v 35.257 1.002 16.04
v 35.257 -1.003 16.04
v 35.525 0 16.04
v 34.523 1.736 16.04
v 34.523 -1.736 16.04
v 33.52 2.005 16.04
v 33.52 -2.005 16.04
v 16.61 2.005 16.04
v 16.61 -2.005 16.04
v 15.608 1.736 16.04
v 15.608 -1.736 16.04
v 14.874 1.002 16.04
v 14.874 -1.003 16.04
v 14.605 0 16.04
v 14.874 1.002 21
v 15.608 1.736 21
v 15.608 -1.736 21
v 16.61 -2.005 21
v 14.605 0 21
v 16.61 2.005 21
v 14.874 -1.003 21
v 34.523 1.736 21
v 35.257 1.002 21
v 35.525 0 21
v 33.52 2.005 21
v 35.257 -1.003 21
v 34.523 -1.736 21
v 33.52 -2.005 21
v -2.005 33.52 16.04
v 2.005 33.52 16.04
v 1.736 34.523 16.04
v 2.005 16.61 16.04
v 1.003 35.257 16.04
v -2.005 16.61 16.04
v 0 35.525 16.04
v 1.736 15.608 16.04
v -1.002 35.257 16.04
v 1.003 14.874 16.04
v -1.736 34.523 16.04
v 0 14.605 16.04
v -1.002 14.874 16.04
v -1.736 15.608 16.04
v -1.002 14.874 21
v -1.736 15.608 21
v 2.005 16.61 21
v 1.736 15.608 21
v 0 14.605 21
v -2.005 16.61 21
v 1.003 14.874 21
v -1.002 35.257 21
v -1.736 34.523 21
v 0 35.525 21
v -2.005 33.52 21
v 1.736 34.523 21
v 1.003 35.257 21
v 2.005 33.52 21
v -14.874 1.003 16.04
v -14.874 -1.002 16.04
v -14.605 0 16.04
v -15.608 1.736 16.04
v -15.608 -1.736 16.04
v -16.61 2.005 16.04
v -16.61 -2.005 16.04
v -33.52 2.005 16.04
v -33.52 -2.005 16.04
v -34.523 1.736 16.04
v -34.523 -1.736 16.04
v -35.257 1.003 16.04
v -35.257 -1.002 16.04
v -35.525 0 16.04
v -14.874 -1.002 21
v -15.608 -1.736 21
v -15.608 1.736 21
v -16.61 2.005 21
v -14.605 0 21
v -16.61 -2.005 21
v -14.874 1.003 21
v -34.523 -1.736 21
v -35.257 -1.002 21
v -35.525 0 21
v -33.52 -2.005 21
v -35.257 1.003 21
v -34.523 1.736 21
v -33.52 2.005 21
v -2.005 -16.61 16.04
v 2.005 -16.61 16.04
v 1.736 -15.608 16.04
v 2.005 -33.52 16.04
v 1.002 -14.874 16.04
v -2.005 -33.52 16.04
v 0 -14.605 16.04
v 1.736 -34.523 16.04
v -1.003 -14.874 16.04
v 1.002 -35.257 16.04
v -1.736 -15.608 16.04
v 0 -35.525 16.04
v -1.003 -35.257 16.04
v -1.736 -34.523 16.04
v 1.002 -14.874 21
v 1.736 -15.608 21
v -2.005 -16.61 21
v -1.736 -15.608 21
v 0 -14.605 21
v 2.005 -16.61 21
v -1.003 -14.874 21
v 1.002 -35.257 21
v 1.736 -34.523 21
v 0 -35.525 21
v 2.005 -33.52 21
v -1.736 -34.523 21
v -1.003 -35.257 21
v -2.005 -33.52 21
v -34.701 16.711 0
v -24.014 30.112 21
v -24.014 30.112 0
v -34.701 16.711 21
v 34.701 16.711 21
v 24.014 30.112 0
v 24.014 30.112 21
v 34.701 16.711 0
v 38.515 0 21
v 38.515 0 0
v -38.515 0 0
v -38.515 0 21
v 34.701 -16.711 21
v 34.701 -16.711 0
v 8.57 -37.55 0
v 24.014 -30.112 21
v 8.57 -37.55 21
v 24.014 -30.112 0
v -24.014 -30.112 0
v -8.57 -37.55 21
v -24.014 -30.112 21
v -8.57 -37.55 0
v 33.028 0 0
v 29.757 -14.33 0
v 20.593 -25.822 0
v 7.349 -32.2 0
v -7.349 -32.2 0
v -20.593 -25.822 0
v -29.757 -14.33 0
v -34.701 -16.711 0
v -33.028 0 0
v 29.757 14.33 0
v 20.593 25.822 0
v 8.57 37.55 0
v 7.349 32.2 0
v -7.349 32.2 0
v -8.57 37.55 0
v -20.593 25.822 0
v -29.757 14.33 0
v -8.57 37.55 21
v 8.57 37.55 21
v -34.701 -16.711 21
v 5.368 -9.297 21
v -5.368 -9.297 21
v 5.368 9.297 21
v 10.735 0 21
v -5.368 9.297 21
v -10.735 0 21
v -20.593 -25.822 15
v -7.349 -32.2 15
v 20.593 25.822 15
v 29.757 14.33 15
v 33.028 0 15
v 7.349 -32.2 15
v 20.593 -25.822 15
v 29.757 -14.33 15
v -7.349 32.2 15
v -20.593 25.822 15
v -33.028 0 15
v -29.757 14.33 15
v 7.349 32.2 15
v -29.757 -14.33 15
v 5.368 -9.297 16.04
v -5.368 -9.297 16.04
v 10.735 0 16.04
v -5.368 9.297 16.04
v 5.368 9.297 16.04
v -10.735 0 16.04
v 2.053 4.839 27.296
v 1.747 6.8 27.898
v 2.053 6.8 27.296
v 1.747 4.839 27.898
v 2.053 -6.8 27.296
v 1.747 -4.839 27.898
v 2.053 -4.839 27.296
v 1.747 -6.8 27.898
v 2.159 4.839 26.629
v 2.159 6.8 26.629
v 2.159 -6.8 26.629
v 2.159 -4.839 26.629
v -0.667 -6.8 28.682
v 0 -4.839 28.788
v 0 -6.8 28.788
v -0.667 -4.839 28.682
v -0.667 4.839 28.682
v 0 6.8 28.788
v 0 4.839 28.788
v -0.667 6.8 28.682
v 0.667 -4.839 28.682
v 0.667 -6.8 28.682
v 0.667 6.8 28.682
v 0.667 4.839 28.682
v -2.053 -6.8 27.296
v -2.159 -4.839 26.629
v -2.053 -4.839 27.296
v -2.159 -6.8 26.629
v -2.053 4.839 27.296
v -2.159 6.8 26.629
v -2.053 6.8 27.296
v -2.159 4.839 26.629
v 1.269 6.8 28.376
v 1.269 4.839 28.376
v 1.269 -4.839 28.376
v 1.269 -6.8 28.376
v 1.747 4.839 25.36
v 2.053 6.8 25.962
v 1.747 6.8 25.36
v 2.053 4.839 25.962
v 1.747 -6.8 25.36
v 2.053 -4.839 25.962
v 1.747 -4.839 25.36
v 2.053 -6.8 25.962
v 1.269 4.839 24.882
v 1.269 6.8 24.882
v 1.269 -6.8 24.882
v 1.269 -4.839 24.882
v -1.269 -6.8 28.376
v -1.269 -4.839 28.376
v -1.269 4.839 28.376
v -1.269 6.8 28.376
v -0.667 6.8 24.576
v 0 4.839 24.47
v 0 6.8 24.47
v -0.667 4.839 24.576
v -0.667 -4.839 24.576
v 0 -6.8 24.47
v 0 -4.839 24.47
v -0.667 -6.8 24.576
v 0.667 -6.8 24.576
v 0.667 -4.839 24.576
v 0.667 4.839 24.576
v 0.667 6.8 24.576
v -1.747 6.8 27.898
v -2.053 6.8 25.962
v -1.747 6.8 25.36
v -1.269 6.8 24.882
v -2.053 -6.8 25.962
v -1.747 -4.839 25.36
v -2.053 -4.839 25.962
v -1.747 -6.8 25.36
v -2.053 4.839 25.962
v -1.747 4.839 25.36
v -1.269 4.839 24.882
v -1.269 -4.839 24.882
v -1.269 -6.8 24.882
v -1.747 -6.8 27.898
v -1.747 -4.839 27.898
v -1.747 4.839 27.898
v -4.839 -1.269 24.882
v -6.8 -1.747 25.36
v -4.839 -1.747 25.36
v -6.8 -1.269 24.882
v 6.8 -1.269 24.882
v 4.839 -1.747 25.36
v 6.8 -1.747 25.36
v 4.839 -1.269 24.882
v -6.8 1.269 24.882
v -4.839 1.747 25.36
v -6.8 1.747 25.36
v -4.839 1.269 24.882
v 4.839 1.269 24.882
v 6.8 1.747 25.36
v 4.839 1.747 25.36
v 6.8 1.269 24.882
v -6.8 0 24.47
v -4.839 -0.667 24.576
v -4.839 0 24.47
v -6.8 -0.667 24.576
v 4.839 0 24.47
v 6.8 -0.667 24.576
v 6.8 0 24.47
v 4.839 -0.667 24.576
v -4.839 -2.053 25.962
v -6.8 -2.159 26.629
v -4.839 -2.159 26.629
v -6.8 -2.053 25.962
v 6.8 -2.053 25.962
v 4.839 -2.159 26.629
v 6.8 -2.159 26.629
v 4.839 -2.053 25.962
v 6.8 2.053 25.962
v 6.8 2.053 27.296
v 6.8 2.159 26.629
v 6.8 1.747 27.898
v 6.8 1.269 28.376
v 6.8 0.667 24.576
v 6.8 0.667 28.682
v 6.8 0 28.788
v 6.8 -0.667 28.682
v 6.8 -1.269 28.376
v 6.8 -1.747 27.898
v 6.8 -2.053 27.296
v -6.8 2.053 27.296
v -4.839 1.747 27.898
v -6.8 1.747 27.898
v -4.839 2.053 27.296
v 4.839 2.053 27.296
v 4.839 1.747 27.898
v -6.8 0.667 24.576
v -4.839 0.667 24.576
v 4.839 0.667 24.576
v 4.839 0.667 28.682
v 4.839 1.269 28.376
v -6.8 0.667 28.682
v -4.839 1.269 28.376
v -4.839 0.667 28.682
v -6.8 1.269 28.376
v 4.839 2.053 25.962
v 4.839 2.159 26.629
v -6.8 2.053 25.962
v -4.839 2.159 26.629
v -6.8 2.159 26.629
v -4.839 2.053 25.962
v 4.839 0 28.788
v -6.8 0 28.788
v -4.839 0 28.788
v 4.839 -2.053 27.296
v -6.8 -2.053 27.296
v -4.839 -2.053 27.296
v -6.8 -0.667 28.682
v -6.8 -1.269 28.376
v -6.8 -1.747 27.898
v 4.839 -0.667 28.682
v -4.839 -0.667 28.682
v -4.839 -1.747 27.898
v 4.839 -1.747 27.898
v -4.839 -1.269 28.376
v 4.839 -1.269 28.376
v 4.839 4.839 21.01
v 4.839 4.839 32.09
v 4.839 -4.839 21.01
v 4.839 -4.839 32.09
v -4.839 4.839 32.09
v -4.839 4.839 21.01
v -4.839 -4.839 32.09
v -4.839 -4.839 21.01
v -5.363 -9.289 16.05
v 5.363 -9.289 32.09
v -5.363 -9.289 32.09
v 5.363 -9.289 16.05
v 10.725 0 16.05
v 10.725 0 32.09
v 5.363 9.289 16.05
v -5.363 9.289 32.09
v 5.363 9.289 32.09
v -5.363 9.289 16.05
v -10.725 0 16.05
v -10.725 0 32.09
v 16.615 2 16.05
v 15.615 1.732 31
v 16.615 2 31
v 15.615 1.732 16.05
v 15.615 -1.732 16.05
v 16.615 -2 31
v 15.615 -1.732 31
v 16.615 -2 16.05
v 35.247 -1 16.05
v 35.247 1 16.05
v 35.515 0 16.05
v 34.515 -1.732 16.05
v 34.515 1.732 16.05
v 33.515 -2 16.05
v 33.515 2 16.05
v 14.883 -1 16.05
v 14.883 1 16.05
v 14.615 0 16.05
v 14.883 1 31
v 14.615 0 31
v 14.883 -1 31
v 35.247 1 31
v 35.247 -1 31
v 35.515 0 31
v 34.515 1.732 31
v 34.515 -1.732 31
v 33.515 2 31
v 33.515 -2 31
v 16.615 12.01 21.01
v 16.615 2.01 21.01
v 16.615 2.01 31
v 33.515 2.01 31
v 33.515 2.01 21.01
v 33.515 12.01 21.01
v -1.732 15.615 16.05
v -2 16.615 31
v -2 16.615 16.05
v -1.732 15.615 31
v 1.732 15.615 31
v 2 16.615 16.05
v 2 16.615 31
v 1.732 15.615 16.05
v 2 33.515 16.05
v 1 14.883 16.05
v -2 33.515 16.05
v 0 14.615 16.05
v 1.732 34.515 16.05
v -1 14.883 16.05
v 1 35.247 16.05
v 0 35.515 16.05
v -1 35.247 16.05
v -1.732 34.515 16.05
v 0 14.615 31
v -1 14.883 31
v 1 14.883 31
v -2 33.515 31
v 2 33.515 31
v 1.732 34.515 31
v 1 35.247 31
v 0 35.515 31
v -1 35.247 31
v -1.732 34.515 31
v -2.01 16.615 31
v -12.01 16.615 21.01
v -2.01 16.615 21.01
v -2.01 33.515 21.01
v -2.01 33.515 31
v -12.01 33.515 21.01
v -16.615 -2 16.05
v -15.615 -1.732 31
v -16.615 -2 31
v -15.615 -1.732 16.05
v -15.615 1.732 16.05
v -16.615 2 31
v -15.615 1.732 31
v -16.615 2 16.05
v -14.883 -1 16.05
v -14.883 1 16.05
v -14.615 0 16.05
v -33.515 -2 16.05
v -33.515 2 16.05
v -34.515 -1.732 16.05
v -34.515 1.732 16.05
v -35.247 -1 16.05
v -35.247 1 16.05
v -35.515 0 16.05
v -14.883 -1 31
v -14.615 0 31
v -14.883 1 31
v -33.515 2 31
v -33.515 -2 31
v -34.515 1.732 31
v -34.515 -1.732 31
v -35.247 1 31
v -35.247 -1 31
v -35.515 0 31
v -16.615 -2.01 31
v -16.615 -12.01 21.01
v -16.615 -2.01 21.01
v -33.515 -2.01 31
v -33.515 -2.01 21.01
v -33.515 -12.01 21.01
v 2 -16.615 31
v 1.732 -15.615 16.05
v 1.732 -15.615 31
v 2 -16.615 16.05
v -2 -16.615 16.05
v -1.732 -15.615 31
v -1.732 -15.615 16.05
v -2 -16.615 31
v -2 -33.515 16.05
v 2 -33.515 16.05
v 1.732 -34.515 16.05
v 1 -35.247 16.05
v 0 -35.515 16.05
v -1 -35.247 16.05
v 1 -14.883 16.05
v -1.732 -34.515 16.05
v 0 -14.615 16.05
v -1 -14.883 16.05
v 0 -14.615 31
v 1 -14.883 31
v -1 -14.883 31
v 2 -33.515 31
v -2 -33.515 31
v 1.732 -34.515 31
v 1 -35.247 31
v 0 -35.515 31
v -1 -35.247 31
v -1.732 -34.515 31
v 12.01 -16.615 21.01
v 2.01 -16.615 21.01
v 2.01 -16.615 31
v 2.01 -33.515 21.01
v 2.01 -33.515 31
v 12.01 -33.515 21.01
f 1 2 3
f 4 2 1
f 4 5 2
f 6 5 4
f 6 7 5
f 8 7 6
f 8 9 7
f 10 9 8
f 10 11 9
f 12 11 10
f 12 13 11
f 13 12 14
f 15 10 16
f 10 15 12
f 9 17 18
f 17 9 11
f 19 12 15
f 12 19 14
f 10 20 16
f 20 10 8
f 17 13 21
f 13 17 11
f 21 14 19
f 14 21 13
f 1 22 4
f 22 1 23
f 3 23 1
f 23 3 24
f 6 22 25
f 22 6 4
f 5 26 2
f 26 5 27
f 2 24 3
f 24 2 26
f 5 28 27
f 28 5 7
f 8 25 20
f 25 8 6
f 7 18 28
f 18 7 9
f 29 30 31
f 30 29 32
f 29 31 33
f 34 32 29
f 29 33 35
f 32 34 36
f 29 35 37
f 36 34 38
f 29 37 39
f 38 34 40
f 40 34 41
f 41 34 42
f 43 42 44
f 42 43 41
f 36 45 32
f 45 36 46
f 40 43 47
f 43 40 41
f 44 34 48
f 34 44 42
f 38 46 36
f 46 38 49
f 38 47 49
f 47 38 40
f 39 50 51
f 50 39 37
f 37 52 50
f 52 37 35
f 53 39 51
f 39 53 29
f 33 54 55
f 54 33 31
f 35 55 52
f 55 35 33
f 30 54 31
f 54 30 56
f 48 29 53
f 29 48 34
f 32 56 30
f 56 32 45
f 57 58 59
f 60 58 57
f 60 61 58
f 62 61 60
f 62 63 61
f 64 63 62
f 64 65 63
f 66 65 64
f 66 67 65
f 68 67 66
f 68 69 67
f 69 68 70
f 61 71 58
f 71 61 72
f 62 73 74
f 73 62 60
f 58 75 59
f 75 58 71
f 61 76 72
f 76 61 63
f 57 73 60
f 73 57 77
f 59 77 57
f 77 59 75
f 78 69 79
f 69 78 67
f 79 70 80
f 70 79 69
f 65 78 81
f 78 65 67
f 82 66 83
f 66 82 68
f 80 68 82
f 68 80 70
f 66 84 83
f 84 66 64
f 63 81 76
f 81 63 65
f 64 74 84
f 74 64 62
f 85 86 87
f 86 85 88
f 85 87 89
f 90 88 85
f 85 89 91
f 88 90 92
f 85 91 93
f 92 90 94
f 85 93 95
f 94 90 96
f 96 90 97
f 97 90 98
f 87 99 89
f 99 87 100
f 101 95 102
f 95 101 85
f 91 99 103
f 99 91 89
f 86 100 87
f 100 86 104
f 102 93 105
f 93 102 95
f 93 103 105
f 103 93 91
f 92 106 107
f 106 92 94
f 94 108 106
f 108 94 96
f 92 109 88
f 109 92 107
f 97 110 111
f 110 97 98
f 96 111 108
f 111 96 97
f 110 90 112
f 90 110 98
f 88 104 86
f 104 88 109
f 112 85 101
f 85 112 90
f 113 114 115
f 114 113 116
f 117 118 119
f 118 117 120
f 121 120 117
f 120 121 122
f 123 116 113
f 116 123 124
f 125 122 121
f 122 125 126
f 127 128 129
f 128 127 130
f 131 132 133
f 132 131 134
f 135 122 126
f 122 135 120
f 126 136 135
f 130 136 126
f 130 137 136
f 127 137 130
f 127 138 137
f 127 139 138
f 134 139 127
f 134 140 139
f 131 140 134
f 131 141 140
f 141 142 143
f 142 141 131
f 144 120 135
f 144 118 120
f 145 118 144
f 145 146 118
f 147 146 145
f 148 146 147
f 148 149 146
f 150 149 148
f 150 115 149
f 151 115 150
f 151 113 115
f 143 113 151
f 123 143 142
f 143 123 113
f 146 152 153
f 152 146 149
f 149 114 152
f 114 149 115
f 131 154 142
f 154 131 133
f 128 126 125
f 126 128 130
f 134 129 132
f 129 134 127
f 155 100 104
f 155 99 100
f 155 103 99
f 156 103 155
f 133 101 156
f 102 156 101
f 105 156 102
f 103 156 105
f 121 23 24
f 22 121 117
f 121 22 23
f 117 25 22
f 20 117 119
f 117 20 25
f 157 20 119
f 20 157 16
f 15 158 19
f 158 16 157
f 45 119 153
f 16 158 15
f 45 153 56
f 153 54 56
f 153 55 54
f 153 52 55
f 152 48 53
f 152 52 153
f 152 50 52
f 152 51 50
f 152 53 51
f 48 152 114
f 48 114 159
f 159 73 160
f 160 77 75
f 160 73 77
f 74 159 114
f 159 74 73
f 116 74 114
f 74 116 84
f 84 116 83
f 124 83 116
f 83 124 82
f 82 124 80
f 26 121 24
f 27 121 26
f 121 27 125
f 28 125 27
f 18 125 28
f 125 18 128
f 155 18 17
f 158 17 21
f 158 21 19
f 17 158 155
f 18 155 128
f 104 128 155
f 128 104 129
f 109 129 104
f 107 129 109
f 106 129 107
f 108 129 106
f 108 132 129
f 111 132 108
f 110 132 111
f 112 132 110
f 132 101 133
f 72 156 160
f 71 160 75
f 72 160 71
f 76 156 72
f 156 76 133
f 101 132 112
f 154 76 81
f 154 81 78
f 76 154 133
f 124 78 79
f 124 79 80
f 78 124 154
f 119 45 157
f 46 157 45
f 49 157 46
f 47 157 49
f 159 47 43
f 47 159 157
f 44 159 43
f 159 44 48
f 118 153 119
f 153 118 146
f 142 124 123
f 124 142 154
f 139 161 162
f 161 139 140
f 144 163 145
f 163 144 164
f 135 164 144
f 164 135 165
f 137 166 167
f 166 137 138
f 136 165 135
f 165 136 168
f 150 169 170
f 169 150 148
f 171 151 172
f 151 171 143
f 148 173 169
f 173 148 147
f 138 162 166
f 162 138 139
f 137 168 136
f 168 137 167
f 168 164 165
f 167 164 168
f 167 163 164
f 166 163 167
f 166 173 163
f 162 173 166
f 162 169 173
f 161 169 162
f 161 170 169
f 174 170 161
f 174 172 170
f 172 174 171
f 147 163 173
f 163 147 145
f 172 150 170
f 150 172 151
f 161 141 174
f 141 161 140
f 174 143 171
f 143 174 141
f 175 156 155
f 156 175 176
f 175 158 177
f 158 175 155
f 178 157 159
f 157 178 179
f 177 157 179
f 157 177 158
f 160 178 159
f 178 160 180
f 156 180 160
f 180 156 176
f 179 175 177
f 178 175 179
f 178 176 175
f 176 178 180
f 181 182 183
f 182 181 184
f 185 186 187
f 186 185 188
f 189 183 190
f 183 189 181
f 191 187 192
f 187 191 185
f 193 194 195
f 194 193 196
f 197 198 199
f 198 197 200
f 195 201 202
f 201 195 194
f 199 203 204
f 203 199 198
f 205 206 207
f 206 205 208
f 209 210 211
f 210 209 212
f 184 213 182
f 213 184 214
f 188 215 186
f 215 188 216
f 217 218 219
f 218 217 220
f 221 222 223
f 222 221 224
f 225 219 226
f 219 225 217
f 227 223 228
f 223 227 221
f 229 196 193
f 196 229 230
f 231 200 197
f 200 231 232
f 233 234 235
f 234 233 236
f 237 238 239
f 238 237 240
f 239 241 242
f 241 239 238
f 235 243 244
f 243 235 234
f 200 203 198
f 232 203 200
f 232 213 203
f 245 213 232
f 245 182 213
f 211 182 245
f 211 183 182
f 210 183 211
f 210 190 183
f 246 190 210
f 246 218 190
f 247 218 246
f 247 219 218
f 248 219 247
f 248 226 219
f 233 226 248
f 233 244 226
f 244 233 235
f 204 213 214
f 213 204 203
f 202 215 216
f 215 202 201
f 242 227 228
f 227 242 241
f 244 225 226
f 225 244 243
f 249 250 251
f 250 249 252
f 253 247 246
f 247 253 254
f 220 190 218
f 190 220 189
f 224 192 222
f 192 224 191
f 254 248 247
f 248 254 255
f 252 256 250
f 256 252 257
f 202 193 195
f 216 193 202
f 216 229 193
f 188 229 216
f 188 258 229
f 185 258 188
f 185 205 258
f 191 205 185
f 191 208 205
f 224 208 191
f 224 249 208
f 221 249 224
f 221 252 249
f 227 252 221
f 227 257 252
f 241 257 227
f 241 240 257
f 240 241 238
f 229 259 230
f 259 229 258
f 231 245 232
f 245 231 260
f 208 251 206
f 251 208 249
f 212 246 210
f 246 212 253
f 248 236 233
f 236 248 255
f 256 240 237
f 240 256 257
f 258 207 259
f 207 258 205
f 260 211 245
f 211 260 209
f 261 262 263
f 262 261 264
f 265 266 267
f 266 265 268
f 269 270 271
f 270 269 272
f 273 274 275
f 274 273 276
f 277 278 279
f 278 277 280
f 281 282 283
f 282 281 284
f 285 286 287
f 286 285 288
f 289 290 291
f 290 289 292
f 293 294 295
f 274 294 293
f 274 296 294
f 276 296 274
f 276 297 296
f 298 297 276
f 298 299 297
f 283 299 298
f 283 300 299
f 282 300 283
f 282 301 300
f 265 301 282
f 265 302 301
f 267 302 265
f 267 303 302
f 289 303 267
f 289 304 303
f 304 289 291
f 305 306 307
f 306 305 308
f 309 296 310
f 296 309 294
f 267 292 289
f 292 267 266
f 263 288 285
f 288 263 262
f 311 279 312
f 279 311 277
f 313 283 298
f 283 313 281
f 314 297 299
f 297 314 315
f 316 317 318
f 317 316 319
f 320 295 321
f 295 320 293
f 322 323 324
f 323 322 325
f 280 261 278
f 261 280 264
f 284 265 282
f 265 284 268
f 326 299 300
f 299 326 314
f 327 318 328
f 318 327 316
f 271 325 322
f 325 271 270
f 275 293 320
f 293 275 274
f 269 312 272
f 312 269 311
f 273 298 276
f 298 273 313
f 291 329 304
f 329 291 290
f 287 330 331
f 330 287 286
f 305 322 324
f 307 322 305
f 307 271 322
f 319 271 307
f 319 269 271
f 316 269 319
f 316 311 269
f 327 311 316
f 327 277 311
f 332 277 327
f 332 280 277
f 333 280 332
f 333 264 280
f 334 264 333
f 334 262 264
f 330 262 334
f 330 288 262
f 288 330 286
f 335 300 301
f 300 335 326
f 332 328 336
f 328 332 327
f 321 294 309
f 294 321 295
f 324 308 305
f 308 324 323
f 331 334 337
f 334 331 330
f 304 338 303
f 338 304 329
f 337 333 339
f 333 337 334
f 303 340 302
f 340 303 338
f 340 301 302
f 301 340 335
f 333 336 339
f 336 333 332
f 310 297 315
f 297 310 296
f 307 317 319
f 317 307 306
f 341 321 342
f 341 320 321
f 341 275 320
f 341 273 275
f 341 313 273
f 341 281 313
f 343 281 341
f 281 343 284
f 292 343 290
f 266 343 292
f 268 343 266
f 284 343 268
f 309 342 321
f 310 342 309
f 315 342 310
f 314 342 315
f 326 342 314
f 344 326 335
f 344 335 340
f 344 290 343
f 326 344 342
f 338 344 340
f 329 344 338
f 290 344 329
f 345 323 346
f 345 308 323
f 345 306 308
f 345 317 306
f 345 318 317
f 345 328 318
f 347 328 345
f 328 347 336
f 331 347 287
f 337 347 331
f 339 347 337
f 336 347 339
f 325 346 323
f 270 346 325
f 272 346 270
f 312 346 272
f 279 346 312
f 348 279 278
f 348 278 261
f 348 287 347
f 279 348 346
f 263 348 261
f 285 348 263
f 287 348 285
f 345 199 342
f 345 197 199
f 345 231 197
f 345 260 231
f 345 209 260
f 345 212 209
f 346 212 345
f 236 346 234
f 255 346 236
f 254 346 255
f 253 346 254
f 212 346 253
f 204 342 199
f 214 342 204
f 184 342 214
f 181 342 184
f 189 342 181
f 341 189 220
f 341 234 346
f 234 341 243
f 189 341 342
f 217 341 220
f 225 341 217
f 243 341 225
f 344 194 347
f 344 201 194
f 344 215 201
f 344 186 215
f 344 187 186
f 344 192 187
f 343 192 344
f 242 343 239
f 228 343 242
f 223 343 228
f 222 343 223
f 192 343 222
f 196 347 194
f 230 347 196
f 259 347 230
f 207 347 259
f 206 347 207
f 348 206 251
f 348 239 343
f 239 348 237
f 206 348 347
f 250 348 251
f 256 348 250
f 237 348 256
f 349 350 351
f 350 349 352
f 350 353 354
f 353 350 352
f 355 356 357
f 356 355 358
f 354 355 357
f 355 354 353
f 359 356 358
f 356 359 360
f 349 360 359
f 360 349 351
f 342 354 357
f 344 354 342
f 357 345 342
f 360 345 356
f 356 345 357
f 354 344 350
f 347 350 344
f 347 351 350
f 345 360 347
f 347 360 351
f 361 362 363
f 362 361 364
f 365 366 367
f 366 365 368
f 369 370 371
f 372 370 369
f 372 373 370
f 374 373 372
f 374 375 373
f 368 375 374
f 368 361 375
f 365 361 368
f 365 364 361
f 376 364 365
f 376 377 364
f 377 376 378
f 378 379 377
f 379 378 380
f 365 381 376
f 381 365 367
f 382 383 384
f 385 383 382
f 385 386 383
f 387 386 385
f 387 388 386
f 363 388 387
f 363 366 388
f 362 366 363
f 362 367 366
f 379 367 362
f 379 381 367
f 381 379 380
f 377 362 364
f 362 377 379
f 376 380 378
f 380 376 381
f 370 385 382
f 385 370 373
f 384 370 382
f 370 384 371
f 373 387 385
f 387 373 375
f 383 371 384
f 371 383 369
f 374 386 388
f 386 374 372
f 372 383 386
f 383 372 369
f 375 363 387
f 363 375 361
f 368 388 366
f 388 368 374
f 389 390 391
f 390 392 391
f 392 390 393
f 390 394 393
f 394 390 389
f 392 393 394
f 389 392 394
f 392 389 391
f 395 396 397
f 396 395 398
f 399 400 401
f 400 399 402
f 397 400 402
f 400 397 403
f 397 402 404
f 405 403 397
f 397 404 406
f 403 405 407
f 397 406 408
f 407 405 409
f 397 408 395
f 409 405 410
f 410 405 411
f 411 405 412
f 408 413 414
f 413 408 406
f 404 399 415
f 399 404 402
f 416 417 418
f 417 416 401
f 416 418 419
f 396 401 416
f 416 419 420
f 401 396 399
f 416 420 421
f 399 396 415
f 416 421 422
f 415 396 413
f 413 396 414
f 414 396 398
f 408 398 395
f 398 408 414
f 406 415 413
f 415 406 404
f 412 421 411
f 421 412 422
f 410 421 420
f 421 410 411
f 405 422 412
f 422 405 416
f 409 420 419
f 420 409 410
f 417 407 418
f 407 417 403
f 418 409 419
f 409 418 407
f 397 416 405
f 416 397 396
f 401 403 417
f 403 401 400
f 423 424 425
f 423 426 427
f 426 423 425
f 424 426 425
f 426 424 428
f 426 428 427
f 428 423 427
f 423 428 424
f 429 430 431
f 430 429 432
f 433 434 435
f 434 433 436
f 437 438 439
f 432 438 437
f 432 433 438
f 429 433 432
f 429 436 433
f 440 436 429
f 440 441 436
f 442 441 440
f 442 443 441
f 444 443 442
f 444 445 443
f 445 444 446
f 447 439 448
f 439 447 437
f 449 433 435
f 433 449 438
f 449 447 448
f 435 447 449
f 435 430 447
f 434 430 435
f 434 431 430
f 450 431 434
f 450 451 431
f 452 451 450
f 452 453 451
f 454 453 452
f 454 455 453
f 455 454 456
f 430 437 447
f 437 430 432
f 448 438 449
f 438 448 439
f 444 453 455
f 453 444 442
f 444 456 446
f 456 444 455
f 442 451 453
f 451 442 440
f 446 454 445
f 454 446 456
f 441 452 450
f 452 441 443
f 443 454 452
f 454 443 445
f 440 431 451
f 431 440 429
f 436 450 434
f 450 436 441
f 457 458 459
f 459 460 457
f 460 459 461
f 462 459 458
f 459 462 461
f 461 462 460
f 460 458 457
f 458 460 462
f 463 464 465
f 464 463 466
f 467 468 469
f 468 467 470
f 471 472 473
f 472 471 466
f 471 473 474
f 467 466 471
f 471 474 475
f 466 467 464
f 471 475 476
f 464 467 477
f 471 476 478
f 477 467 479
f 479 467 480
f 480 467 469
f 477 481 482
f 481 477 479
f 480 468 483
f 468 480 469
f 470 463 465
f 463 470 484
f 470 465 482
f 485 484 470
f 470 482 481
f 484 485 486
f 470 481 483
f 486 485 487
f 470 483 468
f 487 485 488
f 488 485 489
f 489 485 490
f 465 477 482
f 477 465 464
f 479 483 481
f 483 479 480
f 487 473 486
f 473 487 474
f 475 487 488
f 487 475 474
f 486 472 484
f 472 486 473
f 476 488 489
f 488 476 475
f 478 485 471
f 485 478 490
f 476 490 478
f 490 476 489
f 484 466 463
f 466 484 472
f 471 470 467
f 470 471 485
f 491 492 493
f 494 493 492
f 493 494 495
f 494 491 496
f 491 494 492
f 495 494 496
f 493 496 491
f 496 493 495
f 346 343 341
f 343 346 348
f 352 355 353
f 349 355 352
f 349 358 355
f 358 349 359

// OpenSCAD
/* Version 1.0
By JP Cuzzourt 2019
Please abide by the attached CC license - no commercial use please
*/

/* [Size] */
//Diameter of filter across flats in mm
filterSize=63.4;
//How much clearance across flats? (mm)
ClearanceAF=1.0;//[0:0.1:2]
//Size of nut? (mm)
nutSize=19;
//Add 3/8" Square Drive?
squaredrive=1; // [1:yes, 0:no]
//Customizer doesn't support booleans, thus the use of 0 or 1 choice here

/* [Hidden] */

mmPerInch=25.4;
squareDrive=(squaredrive==1 && (nutSize>=15));//3/8" drive will not fit smaller than 15mm nut

//Original code was written for the full diameter, e.g. across points.
//This version lets user enter their own measurement across the flats, so we will calculate the true diameter
//assuming 14 flutes
Rc_Ri_14 = 1.02571637279; //Ratio of circumscribed to inscribed radius for 14 sided polygon
TrueDiameter=filterSize*Rc_Ri_14;

capWrench(diameter=TrueDiameter, Clearance=ClearanceAF, nut=nutSize, squareDrive=squareDrive);
epsilon =   0.01;//to prevent ambiguous surfaces
bot_thk =   1.05; //amount of material, part of thickness, that is not impaled by the structures
    
module capWrench(diameter=74, Clearance=1,
                flutes=14, thickness=6.0, top=21,
                nut=19, squareDrive=true, eps=epsilon){
      
    r1=diameter/2+thickness;            //outer radius 
    r2=(diameter + Clearance*1.0257)/2; //inner radius
    color([.75,.75,.5])
         
                    
    //cap "socket" to fit filter
    //difference will not only cut the main opening, but also opens up the 
    //holes for inserting our fittings, the nut, and finger grips
    //these recesses will cause the slicer to generate wall structures extending under the surface for much greater strength
    difference(){
        cylinder(r=r1,h=top,$fn=flutes);//main solid body
        translate([0,0,-eps])
        cylinder(r=r2,h=top-thickness+eps,$fn=flutes);//interior opening
        translate([0,0,top-thickness-eps+bot_thk]) //Leave about 1mm of bottom (bt_thk)
        cylinder(r=nut*1.129/2+eps,h=thickness-bot_thk+2*eps,$fn=6); //make a hex shaped hole to fit the nut through for strength
        grips(length=griplen+2*eps, height=root+2*eps, width=grip_w+eps, root=root, gripr=grip_x-eps, gripz=grip_z-eps, strut=false);
        //grips hole is sized slightly larger than grips by amount eps
   }
    //now let's fill that hole back in with a hex mesh, not part of the cap
    color([0,0,0]) //just for troubleshooting. Makes it easier to visualize that it's correct.
    translate([0,0,top-thickness+bot_thk])
    cylinder(r=nut*1.129/2,h=thickness-bot_thk+eps,$fn=6); //sticks out the top by eps to join solidly with the rest of the nut that we add next
    
    //https://www.engineersedge.com/hardware/square-drive-tools.htm is the source for some of my dimensions below
    //I'm trying to use values that will work with any driver that is in-spec
    //nut on top for socket or 3/8" drive
    nut_thk=11.1;
    //specs for ratchet driver end length are 
    //10.3 to 11.1 mm 
    drv_hole=0.381*mmPerInch; //(just over 3/8")
    //specs are .378"-.383" min to max
    //first attempt at .375 was too small
    Df=0.215*mmPerInch;
    //Depth of center of dimple or hole for plunger
    //Specs are .209"-.221"
    Em=0.170*mmPerInch;
    //minimum diameter for the hole to receive plunger
    Fm=0.156*mmPerInch;
    //maximum plunger ball diameter
    rNut=nut*1.129*0.99/2;
    //undersize nut flats by 1% to allow for slight
    //printer variances. Standards typically allow about a 4% downward variance here. 
    //Also, the 1.129 factor
    //is to convert flat-flat dimension to full
    //circle dimension for hexagon
    translate([0,0,top-eps])
    difference(){
    //hexagonal nut
    color([.75,.75,.75])
    cylinder(r=nut*1.129/2,h=nut_thk,$fn=6);
        if(squareDrive){
        //minus a square hole for driver
        cube([drv_hole,
              drv_hole,
              2*nut_thk+eps],
              center=true);    
        //and some dimples to accept a plunger ball
        dimples(depth1=nut_thk-Df,
                depth2=drv_hole+Fm,
                radius=Em/2);
        }
    }
    //now lets add the grips
    //first adjust the size to fit our wrench and nut dimensions
    griplen=r1-thickness/2-nut/1.3;
    root=thickness-bot_thk;
    gripht=10;
    gripend=r1-thickness/2;
    grip_x=gripend-griplen; //center x position
    grip_z=top-root;
    grip_w=4;
    grips(length=griplen, width=grip_w, height=gripht, root=root, gripr=grip_x, gripz=grip_z);
}
module grips(length=15, height=10, root=5,strut=true, width=4, gripr=18, gripz=15.1){
    
   //use a loop to make 4 of these.
    for(a=[0:90:270]){
        color([.25,.25,.5])
        rotate([0,0,a]) //a is 0,90,180,270
        translate([gripr,0,gripz])
        {
    //root=how deep the grip extends below the surface
    eps=0.01; //distance to separate or overlap meshes
    rad=width/2; //radius of rounding cylinders
    cubex=length-2*rad; //x dimension of the base grip cube
    triht=height-eps; //triangular strut height
    tribase=height; //triangular foot length
    //our strut is a Right Triangle with base tribase and height triht
    //strut is shifted up by eps so it doesn't join the top
    //and is also shifted away from the grip by eps to keep it separate
    //first a finger grip with round ends
    translate([rad,-width/2,0]) //center on x axis and leave room for cylinder
    {
    cube([cubex,width,height+root]);
    for(x=[0:cubex:cubex]) //a cylinder on each end for nice round shape
        translate([x,rad,0])
        cylinder(r=rad,h=height+root,$fn=12);
    }
    //Now add a right triangular strut is desired
    if (strut) {
    translate([rad,rad+eps,root+eps]) //align with cube and separate by eps
    rotate([0,90,0]) //correct orientation
    linear_extrude(height = cubex) //strut is just as wide as the 'square' part of our grip
    polygon(points = [ [0,0], [-triht,0], [0, tribase]]); //simple right triangle positioned to extrude and easily rotate into position
    }
    
}




       }

    }


module dimples(height=5.639,depth=13.6,radius=2.16){
    /*generates a pair of perpendicular cylinders
    that module CapWrench() uses to etch out
    depressions to accept a ball bearing plunger to
    snap the ratchet or driver male end into
    The defaults are just initial base case values
    derived from my nut sizing choices and
    available driver and socket engineering data.
    */
    for(x=[[90,0,0],[0,90,0]]){
         //[90,0,0] and [0,90,0] rotations for two perpendicular cylinders that punch hols in the sides of the square hole
    translate([0,0,height])    
    rotate(x) //rotate 90 degrees through x first time, 90 degrees through y axis the second time
    cylinder(r=radius, h=depth, center=true,$fn=20);//the ends of the cylinders will extend into the sides of the square 
        //drive opening and be subtracted out.
    }
}
